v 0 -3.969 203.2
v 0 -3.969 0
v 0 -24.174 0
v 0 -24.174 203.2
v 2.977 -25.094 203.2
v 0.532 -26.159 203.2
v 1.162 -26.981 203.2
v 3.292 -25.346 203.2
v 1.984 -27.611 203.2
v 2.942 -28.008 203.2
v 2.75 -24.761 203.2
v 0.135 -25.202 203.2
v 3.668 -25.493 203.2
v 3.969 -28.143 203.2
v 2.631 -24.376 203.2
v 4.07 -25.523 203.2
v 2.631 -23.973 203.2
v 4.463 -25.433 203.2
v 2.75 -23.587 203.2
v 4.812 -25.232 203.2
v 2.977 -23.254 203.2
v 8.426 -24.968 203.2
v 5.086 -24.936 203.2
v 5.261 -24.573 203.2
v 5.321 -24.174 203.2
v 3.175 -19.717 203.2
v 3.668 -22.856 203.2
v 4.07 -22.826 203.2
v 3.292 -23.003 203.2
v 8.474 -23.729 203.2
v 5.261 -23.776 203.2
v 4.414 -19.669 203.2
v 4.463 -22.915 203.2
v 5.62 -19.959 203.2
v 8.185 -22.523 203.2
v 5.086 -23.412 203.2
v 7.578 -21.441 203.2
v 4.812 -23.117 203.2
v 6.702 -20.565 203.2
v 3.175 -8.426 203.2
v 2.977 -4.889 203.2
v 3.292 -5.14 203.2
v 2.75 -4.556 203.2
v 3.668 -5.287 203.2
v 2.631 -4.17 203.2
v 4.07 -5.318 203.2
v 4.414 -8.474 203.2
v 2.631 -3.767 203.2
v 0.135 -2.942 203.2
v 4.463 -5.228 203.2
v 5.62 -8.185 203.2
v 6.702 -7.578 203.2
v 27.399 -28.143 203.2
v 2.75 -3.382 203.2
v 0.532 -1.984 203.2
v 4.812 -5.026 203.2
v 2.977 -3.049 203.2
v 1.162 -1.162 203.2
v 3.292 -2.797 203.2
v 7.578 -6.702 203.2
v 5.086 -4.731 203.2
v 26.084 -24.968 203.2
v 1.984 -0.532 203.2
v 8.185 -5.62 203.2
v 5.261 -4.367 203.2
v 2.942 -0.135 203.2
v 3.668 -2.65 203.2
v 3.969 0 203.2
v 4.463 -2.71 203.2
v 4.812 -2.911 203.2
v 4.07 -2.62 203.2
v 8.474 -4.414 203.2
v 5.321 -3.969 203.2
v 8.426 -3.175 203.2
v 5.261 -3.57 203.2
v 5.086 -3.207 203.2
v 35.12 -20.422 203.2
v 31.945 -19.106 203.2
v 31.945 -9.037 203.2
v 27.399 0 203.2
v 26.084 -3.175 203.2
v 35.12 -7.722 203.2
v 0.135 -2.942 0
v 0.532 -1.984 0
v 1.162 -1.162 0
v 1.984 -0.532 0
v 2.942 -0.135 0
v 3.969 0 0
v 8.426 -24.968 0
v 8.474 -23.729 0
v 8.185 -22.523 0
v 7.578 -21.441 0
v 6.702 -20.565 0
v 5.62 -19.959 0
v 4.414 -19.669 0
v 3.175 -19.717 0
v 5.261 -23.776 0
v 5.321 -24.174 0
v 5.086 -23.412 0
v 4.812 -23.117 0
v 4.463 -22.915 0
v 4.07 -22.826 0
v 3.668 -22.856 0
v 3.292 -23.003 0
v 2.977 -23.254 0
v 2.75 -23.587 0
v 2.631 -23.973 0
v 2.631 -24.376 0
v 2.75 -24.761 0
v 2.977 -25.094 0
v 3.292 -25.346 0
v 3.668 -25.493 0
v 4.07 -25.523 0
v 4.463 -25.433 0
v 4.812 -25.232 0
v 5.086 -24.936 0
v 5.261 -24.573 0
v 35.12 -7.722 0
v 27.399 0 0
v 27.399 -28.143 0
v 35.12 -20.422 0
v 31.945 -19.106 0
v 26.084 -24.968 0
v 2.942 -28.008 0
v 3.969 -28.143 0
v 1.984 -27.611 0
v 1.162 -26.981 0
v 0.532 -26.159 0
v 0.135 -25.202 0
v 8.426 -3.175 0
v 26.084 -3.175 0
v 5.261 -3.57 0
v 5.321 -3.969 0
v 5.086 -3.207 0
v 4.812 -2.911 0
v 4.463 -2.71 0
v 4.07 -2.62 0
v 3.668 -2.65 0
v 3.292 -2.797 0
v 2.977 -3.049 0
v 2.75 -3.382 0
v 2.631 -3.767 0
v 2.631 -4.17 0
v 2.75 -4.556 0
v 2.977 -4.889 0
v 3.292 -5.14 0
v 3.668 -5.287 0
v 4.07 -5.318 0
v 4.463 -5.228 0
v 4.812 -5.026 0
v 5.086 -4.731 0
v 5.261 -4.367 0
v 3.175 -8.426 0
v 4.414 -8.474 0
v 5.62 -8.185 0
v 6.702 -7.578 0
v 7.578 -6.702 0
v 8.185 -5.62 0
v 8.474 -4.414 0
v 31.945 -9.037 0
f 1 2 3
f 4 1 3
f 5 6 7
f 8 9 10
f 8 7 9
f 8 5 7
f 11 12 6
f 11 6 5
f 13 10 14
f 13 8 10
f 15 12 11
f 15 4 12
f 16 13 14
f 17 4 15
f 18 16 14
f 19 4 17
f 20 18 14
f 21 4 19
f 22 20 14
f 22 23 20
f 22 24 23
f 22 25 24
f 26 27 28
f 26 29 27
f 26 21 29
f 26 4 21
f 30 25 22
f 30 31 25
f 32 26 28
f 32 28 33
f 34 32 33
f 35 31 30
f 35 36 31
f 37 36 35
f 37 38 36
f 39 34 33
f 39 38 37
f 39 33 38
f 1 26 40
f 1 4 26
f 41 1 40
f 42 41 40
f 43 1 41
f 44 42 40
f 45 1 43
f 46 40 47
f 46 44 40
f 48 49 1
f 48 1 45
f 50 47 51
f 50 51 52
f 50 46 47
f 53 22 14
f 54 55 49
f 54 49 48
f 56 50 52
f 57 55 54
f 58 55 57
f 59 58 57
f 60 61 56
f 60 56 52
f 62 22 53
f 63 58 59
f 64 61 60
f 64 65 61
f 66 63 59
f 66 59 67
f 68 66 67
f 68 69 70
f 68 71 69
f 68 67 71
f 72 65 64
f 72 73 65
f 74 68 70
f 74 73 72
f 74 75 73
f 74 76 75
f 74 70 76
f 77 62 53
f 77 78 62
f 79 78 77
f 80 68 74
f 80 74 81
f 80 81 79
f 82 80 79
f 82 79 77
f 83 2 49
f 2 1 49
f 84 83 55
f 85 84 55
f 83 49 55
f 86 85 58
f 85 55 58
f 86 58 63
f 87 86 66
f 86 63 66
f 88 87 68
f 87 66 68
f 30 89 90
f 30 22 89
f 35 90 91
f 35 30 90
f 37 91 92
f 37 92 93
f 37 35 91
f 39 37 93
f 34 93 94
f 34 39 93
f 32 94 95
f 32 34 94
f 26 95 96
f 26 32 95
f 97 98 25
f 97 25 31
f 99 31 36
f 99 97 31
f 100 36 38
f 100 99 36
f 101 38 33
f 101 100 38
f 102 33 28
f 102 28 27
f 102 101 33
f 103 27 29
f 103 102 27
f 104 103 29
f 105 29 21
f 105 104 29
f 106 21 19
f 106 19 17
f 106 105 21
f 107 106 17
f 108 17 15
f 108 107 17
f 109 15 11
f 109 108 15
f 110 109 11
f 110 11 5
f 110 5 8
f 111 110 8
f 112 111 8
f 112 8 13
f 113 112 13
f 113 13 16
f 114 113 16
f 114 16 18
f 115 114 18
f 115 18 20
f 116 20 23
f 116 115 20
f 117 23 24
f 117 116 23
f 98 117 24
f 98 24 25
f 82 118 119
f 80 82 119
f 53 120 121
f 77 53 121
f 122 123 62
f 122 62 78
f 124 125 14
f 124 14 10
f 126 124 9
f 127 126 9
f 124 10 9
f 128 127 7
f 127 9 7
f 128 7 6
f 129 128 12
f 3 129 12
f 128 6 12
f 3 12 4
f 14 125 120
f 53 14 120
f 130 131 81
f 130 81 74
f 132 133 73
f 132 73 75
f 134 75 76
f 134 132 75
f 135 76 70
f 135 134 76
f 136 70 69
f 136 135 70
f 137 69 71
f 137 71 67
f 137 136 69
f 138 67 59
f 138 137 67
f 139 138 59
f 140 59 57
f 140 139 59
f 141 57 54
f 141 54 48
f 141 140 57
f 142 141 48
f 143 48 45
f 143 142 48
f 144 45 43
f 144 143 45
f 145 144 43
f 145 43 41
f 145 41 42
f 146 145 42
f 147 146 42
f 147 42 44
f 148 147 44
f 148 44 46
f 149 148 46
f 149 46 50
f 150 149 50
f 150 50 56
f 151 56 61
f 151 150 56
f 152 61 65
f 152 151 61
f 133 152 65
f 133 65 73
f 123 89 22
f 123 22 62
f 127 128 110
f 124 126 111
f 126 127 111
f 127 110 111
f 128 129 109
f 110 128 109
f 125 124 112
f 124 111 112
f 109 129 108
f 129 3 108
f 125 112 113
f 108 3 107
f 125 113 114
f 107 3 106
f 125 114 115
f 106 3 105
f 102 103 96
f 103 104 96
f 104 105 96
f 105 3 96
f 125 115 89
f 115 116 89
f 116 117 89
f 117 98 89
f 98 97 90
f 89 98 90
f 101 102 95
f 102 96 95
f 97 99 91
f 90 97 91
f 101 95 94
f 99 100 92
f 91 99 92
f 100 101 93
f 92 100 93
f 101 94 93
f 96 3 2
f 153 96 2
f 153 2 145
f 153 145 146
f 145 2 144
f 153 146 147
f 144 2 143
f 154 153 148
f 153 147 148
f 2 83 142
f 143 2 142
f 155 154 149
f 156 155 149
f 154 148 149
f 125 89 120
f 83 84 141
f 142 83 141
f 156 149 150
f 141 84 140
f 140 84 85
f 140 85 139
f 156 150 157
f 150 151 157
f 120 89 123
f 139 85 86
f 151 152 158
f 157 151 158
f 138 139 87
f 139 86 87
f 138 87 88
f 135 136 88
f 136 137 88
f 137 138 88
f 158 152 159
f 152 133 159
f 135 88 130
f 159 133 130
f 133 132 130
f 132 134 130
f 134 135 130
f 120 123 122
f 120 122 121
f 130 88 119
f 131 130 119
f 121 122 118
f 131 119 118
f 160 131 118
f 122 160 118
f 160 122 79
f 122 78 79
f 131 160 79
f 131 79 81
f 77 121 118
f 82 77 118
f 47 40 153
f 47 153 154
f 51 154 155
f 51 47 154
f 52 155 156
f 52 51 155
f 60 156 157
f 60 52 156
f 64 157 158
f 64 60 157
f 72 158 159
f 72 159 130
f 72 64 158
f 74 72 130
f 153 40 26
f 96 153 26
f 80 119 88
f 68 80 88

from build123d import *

# Parameters (mm, degrees)
F0_R     = 1.35255
F1_DEPTH = 203.2
F2_T     = -3.175
F3_DEPTH = 3.175
F4_R     = 3.96875


with BuildPart() as f1:
    # F0 (on Top) → F1 (new body)
    with BuildSketch(Plane.XY):
        Polygon((35.120382905, -7.7215365), (27.398846405, 0), (0, 0), (0, -28.143073), (27.398846405, -28.143073), (35.120382905, -20.4215365), align=None)
        with Locations((3.96875, -24.174323)):
            Circle(F0_R, mode=Mode.SUBTRACT)
        with Locations((3.96875, -3.96875)):
            Circle(F0_R, mode=Mode.SUBTRACT)
    extrude(amount=F1_DEPTH)

    # F2
    f2_openings = [f1.faces().sort_by_distance(p)[0] for p in [
        (16.75641, -14.071537, 203.2),
    ]]
    offset(amount=F2_T, openings=f2_openings)

    # F3 (cut, through all): a face of the model
    f3_faces = [f1.faces().sort_by_distance(p)[0] for p in [
        (17.830633935, -14.0715365, 3.175),
    ]]
    extrude(f3_faces, amount=-F3_DEPTH, mode=Mode.SUBTRACT)

    # F4
    f4_edges = [f1.edges().sort_by_distance(p)[0] for p in [
        (0, 0, 101.6),
        (0, -28.143073, 101.6),
    ]]
    fillet(f4_edges, radius=F4_R)


solid = f1.part
